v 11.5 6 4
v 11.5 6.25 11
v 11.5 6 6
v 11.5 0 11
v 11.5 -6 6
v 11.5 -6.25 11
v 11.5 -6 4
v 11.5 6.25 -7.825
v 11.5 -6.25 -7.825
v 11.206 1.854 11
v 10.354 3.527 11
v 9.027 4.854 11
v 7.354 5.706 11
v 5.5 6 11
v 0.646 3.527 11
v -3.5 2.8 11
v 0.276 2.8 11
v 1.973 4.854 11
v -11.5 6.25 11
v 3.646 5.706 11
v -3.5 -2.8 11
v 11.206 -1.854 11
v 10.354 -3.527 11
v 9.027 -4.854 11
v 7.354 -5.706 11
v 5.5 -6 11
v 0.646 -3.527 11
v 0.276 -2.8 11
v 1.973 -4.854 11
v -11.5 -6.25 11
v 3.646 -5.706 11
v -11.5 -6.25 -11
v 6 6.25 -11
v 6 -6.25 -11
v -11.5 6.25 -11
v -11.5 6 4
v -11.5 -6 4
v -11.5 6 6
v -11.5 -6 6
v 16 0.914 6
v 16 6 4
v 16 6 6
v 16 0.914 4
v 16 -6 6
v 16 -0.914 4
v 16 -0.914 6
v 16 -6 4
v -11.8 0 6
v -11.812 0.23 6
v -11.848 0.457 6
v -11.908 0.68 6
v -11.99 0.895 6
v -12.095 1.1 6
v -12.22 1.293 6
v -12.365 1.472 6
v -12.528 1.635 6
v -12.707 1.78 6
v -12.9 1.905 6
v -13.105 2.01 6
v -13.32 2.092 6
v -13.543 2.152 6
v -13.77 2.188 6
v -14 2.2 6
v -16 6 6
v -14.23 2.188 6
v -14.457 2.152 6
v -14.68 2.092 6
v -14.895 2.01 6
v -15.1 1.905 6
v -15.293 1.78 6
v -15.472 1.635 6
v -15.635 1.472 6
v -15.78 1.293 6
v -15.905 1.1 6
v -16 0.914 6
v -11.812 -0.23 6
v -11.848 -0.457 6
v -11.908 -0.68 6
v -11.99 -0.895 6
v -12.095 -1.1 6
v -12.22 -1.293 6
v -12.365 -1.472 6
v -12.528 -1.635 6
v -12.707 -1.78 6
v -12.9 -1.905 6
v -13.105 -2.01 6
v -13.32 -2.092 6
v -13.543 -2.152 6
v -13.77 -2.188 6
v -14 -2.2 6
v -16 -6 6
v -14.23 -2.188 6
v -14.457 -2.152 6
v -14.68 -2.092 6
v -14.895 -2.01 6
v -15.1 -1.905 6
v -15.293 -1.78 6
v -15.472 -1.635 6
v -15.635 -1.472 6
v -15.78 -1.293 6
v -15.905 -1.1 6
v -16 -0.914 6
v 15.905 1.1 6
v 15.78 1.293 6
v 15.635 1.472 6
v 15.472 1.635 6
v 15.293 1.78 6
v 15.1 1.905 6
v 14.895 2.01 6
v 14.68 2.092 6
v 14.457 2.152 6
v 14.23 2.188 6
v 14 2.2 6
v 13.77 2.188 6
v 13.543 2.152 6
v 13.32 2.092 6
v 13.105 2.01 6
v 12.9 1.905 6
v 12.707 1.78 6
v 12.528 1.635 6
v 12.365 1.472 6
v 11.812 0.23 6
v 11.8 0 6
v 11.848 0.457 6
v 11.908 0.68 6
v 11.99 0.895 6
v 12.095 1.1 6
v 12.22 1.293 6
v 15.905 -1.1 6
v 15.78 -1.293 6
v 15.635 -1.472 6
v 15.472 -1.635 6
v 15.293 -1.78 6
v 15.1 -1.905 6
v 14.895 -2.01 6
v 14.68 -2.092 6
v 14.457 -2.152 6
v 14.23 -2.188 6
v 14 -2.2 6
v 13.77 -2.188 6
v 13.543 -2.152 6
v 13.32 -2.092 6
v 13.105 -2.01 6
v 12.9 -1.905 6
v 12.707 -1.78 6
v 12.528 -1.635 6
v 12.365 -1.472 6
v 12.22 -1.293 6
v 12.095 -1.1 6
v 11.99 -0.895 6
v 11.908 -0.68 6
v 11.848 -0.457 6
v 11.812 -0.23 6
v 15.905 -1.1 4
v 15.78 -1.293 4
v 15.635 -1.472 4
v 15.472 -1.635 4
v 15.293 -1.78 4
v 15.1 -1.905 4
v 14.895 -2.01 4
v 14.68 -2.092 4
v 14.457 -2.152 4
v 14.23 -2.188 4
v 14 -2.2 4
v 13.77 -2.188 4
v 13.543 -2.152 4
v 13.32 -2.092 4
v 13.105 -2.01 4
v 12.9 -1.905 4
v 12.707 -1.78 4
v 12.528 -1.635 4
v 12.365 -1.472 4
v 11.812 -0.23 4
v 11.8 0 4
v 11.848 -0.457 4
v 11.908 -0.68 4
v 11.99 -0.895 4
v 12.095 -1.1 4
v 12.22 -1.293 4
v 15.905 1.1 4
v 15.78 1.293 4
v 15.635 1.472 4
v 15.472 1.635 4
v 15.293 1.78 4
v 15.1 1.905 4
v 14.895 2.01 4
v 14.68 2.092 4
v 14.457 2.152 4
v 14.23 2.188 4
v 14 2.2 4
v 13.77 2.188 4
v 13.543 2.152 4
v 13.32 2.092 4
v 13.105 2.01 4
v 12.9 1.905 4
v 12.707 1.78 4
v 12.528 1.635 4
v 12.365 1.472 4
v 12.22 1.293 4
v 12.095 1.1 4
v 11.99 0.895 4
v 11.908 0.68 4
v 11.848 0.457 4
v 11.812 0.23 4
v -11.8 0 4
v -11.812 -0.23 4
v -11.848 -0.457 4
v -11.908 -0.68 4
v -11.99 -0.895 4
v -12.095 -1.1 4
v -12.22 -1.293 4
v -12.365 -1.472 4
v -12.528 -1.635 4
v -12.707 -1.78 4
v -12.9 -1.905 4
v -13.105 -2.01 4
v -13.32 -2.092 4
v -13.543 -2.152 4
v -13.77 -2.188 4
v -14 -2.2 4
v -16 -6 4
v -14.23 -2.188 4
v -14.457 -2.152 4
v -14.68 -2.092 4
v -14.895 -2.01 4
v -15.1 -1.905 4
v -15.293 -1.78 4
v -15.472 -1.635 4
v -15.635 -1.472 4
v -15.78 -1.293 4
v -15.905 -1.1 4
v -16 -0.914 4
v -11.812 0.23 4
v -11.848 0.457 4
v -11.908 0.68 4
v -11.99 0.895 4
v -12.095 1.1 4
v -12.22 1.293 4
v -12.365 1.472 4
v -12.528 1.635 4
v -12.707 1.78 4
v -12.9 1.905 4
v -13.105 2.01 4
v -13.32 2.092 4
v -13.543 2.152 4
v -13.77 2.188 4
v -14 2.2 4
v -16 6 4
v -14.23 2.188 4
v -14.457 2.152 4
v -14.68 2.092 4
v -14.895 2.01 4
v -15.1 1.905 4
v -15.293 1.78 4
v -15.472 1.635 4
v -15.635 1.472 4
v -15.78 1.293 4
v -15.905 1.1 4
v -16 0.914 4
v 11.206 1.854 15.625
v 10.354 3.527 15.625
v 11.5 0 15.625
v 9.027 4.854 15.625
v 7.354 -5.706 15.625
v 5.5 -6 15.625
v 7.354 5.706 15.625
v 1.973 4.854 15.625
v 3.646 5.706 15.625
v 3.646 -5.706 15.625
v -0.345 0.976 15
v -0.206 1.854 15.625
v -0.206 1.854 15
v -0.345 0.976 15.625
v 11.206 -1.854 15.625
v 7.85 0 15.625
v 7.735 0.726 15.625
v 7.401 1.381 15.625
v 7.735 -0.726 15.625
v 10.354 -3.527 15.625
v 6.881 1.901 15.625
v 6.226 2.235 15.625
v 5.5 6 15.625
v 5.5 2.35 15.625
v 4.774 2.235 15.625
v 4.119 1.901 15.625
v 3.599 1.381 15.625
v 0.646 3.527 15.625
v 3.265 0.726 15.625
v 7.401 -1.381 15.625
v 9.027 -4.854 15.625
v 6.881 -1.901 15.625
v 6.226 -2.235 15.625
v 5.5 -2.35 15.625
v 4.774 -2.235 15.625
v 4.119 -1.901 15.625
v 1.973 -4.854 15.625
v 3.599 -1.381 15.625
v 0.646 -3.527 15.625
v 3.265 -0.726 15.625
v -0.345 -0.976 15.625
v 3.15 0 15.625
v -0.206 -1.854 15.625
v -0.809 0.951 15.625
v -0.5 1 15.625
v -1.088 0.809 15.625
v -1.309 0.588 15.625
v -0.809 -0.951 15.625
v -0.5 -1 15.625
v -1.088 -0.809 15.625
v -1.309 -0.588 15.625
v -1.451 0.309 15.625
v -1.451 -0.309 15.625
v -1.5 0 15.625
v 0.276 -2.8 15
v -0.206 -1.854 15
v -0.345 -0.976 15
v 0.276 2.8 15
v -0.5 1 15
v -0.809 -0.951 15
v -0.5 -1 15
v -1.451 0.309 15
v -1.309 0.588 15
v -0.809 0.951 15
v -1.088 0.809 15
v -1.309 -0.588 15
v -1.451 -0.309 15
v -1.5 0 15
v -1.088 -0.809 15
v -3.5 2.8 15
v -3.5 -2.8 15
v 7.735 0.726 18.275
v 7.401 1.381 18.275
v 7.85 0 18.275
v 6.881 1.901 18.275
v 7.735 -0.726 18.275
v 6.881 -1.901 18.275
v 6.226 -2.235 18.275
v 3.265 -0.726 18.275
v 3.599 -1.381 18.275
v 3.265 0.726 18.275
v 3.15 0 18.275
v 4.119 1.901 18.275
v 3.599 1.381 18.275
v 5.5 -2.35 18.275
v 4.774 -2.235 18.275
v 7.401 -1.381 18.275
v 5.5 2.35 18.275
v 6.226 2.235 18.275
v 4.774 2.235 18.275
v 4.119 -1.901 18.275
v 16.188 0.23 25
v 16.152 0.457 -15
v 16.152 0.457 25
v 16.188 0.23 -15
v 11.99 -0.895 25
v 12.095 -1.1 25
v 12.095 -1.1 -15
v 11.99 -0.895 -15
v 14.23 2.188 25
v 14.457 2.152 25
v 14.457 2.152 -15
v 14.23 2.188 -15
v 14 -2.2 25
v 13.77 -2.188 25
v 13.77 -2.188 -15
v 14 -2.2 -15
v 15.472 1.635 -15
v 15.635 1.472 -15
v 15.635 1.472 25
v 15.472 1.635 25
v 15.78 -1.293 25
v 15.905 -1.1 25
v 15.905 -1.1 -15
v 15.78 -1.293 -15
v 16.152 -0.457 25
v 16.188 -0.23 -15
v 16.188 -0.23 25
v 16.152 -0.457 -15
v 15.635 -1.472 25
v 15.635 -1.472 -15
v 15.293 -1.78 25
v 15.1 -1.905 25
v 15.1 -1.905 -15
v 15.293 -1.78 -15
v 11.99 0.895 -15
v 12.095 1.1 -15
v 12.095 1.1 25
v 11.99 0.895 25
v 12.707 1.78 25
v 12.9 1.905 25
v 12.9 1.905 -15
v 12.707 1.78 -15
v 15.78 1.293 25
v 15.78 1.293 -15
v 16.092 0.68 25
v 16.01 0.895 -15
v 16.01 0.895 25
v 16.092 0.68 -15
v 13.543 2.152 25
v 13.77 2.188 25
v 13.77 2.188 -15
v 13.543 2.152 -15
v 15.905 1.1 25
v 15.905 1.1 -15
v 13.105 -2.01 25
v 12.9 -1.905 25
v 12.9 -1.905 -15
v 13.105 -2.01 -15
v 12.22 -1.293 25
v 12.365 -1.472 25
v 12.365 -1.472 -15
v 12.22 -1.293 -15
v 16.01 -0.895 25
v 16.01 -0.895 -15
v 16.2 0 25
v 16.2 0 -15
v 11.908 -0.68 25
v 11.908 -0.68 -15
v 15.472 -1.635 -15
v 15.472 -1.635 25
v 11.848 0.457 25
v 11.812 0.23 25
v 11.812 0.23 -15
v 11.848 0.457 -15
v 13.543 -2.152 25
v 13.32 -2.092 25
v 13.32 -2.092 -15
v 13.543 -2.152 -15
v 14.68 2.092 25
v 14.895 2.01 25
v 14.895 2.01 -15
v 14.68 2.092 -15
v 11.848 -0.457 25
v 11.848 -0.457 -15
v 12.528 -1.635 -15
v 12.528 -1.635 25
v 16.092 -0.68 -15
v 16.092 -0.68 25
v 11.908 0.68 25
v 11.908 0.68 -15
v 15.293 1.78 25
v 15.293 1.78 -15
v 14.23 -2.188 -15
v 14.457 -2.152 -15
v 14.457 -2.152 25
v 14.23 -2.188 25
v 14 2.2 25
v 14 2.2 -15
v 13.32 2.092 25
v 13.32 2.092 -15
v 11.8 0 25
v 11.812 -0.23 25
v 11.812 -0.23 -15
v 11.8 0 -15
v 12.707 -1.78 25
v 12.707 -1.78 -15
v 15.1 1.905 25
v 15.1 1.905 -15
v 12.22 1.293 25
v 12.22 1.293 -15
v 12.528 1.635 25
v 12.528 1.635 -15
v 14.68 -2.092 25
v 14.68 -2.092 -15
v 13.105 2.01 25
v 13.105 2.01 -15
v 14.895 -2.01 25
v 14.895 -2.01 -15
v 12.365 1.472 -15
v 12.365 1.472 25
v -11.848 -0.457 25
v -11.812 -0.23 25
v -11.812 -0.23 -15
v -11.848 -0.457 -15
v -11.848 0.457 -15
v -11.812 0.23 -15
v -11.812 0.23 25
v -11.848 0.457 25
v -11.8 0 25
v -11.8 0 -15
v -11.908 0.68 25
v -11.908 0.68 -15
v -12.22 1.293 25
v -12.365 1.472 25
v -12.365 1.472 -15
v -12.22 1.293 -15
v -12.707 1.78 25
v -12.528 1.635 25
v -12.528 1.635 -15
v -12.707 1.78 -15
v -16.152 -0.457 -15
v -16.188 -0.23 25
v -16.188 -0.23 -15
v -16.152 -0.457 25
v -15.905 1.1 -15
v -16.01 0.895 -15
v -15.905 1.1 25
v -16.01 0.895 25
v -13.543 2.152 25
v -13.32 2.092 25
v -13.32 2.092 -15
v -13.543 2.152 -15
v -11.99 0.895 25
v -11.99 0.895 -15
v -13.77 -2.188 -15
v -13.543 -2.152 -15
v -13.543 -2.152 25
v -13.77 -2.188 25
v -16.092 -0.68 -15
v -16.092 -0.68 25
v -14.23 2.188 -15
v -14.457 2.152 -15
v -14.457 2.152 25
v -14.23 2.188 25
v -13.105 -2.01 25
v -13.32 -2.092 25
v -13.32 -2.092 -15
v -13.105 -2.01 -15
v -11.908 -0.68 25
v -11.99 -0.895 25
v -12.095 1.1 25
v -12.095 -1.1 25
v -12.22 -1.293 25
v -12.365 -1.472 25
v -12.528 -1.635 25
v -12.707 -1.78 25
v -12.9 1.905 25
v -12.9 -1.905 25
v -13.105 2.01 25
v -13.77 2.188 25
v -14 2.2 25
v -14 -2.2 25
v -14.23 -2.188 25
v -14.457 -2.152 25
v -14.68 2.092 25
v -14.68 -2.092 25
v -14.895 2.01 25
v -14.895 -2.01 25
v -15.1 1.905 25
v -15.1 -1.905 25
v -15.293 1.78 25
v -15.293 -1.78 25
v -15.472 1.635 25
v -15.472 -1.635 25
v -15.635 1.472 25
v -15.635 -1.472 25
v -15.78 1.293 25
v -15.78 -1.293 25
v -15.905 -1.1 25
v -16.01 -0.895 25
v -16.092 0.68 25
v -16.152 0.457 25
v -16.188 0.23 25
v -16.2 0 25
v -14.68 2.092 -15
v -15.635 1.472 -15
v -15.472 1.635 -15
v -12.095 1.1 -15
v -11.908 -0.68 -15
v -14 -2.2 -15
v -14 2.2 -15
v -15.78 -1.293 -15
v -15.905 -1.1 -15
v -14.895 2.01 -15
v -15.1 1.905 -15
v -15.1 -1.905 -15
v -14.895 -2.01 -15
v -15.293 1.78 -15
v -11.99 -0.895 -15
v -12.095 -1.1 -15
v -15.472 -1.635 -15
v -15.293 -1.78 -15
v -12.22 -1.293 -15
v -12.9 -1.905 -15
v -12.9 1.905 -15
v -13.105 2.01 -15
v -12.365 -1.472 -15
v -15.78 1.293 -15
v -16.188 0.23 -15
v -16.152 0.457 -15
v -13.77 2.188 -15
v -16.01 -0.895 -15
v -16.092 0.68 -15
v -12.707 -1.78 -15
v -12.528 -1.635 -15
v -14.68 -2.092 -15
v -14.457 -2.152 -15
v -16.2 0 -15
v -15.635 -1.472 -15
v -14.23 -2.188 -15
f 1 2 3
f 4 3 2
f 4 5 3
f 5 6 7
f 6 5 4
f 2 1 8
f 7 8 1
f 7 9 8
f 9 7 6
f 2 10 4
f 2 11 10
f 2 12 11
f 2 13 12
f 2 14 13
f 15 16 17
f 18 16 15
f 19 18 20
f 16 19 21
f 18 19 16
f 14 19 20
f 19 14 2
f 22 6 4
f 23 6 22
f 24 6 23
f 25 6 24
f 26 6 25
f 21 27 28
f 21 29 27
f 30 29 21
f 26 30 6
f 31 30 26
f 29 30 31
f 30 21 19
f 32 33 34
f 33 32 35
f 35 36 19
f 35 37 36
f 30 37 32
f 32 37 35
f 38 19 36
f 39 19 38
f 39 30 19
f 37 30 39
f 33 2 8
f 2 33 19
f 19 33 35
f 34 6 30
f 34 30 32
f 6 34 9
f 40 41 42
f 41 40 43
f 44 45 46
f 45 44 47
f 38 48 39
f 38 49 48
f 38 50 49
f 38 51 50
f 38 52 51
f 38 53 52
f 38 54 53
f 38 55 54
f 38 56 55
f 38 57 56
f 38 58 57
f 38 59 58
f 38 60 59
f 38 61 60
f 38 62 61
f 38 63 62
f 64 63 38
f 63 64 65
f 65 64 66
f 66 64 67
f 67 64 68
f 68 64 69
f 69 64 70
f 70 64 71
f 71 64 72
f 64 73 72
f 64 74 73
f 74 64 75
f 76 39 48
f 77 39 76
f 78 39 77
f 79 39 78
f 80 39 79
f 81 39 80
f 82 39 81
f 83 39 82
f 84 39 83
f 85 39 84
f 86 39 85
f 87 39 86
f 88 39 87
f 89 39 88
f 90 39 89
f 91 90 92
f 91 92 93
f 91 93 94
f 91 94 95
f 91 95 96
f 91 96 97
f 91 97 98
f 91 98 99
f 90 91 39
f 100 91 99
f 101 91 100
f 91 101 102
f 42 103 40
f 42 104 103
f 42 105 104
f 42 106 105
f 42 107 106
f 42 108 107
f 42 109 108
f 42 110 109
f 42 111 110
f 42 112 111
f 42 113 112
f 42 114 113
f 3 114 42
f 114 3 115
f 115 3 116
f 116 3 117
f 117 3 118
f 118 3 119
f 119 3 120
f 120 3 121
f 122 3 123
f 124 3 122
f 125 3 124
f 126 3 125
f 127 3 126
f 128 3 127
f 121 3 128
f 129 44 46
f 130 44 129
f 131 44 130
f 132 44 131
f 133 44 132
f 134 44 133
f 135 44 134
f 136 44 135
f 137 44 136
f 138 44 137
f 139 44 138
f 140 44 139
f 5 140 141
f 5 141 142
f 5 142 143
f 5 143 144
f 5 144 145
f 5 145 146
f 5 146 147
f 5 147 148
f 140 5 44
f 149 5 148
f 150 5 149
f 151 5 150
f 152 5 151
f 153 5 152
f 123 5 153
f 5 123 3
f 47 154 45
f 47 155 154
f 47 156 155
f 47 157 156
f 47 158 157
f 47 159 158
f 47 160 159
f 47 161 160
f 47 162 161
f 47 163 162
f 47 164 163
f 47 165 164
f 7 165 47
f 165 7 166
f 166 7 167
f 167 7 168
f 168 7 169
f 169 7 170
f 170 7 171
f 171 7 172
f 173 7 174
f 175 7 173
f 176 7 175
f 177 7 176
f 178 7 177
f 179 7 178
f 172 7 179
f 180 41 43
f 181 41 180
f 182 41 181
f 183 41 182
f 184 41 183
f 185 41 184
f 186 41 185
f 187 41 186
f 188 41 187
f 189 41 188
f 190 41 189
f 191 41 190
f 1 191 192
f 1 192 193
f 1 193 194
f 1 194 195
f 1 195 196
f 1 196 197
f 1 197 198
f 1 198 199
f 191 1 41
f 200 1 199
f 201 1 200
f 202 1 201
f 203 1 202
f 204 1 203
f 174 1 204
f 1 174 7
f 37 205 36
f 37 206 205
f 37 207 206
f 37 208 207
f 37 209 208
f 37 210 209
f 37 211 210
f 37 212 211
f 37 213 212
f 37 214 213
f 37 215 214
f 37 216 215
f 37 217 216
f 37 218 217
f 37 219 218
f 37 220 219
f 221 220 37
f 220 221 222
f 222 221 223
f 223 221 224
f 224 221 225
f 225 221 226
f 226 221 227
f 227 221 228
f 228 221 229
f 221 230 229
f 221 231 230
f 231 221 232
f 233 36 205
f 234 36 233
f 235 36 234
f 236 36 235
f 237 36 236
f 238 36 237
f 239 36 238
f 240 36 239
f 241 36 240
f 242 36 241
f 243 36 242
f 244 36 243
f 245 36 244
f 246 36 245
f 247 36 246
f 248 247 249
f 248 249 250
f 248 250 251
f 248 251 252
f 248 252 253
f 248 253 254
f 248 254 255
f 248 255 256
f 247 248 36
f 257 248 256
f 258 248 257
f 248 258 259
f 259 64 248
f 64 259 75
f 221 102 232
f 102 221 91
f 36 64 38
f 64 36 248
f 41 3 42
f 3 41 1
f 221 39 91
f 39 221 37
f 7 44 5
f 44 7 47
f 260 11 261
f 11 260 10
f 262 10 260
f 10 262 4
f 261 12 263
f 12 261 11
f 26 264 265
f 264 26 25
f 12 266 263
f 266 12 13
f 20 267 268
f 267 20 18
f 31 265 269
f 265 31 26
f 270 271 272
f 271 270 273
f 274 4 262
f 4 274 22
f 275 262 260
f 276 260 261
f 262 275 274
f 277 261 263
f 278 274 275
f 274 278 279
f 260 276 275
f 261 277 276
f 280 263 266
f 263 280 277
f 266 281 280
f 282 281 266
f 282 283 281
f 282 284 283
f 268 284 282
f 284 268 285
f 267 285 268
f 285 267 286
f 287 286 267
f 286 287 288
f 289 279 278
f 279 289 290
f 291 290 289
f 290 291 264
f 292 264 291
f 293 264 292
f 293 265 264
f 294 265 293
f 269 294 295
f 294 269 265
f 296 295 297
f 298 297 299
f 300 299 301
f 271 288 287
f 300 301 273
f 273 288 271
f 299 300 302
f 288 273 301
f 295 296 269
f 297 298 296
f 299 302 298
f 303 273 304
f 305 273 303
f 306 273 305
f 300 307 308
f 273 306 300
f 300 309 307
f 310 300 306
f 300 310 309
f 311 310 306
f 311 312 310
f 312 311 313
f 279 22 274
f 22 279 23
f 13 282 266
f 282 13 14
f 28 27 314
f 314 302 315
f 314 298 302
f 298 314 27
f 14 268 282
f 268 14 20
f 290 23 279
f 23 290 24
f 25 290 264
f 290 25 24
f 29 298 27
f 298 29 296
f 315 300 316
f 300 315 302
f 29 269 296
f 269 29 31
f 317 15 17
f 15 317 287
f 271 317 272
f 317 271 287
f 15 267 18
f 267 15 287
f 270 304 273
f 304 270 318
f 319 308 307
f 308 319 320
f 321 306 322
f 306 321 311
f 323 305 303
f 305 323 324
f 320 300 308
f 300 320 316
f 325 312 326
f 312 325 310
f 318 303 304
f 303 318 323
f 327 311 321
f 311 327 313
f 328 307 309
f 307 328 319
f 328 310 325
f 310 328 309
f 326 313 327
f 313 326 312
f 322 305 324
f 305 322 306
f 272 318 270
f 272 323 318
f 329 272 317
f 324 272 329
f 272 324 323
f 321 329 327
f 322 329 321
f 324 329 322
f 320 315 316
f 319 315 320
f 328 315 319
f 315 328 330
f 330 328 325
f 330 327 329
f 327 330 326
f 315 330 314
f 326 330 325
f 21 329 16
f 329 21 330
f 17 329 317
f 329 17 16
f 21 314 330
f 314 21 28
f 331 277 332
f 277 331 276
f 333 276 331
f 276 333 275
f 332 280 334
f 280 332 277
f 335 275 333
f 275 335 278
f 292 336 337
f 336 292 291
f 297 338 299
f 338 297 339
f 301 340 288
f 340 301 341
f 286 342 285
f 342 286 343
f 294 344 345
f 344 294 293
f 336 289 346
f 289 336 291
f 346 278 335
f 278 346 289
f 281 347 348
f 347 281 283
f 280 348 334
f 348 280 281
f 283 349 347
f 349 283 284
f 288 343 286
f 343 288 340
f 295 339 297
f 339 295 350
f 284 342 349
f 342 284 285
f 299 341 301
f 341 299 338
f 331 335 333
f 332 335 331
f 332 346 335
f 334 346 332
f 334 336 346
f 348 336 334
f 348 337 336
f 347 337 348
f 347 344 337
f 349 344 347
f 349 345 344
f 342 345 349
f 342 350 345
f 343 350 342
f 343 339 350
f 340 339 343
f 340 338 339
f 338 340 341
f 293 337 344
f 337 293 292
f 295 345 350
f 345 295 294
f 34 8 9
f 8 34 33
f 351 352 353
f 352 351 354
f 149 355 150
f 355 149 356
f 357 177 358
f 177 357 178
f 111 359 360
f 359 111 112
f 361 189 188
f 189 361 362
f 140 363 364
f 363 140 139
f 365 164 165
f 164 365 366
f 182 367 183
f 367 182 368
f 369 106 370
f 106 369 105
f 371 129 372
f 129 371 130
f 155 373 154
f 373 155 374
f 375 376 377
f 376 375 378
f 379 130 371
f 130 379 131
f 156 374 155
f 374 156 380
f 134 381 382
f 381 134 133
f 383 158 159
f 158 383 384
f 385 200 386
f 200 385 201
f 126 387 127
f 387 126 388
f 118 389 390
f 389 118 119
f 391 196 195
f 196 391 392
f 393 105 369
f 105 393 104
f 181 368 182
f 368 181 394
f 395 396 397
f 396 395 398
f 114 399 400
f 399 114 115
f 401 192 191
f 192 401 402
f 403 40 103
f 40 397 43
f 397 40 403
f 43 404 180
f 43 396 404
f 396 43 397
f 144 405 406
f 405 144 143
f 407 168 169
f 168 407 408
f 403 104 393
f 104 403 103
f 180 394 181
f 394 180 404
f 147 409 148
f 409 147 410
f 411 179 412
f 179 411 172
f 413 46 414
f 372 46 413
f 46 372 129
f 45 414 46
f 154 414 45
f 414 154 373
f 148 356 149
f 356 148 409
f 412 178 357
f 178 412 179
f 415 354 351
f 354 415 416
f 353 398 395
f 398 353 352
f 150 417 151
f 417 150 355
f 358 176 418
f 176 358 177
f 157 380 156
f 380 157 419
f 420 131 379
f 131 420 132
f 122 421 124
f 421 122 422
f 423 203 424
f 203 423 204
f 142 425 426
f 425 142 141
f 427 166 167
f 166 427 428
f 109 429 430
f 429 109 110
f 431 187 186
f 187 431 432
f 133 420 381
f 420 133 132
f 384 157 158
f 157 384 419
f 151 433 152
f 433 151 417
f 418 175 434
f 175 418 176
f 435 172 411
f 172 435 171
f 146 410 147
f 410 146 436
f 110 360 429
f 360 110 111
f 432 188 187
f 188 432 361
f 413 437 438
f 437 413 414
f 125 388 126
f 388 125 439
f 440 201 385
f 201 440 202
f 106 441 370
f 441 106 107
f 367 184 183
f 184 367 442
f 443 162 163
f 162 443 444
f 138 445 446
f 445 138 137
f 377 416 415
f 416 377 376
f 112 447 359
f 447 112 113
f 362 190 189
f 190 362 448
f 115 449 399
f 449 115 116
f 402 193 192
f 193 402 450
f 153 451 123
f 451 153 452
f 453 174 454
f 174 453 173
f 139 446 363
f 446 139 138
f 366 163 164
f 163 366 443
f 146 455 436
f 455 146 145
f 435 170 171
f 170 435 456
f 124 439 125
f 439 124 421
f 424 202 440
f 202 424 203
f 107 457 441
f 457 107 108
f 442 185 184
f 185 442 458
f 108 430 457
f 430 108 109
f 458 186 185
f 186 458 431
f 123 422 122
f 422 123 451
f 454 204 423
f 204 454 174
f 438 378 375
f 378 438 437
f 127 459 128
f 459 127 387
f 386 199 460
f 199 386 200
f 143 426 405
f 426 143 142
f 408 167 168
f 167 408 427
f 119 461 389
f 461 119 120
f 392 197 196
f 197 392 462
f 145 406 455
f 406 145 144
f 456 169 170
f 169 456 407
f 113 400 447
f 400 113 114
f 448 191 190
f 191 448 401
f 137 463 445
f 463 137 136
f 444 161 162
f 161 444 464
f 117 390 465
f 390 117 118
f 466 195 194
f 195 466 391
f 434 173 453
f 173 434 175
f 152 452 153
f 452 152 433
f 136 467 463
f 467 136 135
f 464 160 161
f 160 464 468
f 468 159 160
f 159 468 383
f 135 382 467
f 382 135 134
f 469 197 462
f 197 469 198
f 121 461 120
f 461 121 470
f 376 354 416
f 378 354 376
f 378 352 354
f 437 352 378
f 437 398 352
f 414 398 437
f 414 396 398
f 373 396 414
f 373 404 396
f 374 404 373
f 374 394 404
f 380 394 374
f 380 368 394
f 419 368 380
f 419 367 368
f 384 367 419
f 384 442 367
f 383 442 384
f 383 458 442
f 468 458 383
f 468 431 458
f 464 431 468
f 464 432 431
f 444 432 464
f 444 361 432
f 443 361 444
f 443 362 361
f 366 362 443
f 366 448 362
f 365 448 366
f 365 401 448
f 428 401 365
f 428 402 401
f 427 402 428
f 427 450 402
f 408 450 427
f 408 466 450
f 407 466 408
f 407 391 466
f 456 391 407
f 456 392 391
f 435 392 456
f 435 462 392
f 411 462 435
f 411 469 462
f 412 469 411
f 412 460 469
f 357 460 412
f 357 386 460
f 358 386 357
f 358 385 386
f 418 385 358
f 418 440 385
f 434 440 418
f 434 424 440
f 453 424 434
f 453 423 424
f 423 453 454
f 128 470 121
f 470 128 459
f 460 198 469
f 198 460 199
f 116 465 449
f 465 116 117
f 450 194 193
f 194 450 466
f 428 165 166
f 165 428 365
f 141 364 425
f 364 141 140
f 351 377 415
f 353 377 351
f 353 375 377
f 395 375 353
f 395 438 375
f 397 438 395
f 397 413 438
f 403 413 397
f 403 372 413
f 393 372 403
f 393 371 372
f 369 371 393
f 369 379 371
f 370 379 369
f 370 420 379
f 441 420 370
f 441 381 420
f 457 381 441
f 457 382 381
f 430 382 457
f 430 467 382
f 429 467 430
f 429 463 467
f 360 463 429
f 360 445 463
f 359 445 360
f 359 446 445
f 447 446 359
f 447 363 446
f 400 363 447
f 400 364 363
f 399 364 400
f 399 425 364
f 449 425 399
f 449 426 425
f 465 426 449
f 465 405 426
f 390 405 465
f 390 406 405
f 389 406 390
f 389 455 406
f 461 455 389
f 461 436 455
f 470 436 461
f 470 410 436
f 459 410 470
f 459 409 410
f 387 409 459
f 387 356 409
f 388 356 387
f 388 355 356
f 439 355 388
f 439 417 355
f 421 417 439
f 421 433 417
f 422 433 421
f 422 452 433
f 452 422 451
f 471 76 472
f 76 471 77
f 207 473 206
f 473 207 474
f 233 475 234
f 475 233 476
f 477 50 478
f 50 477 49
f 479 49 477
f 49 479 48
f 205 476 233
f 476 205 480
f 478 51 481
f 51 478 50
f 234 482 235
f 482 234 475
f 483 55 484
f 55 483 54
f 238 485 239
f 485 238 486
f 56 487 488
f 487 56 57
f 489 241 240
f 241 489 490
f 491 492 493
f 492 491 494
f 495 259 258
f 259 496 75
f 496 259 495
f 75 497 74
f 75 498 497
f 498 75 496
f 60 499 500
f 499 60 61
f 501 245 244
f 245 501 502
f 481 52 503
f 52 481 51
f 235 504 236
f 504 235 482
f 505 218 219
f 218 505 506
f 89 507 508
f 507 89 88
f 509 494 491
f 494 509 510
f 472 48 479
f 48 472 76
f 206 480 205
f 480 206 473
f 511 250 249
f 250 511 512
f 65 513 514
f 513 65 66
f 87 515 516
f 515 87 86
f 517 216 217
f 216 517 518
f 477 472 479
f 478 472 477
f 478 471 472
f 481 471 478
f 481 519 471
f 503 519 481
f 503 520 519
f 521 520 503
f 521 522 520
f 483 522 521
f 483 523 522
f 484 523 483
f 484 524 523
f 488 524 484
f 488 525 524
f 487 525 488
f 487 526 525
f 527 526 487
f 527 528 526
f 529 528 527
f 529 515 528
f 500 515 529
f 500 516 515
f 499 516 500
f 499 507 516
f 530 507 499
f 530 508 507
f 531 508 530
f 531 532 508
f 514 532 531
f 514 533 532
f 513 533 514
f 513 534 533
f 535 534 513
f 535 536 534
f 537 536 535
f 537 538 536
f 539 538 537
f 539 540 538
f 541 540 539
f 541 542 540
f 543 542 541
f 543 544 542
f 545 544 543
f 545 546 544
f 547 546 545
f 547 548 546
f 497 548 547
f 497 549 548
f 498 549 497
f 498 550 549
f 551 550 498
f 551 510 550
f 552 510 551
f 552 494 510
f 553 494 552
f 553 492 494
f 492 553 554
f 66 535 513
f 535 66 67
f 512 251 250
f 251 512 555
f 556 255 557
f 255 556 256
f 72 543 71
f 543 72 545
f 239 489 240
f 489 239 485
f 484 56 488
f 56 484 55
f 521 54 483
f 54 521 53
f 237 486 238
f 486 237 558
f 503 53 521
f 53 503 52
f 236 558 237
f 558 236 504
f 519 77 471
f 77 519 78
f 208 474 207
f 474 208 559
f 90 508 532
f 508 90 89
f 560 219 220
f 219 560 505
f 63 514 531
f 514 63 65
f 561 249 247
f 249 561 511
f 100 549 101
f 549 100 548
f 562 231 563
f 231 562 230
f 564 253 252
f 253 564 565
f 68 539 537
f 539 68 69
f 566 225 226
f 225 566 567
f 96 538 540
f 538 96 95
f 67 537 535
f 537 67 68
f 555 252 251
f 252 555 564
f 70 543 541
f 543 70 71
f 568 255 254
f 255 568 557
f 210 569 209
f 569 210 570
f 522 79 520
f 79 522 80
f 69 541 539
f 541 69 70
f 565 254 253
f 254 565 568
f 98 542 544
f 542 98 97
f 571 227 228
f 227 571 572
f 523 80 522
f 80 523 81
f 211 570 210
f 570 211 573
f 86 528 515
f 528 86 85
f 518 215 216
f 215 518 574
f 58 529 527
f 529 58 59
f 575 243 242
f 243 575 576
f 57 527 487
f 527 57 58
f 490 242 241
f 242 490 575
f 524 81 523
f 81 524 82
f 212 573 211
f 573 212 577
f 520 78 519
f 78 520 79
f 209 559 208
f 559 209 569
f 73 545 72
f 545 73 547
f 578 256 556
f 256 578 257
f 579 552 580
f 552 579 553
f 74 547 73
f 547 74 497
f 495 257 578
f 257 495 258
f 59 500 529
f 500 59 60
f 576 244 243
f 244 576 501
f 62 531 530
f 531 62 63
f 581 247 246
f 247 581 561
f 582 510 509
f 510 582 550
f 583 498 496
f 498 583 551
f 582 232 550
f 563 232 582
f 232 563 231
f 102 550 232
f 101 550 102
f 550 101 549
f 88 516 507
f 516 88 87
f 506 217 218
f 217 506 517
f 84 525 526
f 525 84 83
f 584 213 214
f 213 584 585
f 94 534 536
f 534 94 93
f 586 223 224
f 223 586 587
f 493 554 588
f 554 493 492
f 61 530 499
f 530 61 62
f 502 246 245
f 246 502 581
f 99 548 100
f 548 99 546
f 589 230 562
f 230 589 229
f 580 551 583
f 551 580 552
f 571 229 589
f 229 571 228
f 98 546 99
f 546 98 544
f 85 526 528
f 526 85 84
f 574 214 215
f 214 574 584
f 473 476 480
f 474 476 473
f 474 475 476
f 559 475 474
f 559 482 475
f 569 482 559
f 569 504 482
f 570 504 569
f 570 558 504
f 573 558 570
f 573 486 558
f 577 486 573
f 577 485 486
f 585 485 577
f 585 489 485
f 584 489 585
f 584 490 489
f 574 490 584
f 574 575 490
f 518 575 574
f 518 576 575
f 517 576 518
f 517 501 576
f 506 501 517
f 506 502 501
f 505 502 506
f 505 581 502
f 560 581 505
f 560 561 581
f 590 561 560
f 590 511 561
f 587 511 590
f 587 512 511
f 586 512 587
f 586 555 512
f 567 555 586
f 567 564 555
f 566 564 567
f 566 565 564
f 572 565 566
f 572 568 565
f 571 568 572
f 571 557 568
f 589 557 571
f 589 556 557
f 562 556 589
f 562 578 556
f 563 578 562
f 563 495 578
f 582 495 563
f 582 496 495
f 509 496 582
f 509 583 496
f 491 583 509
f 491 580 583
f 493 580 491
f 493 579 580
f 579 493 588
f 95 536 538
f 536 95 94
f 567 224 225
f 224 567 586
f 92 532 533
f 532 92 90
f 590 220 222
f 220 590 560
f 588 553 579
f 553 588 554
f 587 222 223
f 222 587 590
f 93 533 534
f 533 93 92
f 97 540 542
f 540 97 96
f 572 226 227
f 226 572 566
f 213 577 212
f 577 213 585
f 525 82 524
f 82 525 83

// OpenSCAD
$fn=60;
sg90_motor();

module sg90_motor(){
	difference(){			
		union(){
			color("green") cube([23,12.5,22], center=true);
			color("blue") translate([0,0,5]) cube([32,12,2], center=true);
			color("blue") translate([5.5,0,2.75]) cylinder(r=6, h=25.75, $fn=20, center=true);
			color("blue") translate([-.5,0,2.75]) cylinder(r=1, h=25.75, $fn=20, center=true);
			color("blue") translate([-1,0,2.75]) cube([5,5.6,24.5], center=true);		
			color("white") translate([5.5,0,3.65]) cylinder(r=2.35, h=29.25, $fn=20, center=true);				
		} // of union()
		translate([10,0,-11]) rotate([0,-30,0]) cube([8,13,4], center=true);
		for ( hole = [14,-14] ){
			translate([hole,0,5]) cylinder(r=2.2, h=4, $fn=20, center=true);
		}	// of for loop
	} // of difference()
    translate([14,0,5])  cylinder(r=2.2,h=40, center=true);
    translate([-14,0,5]) cylinder(r=2.2,h=40, center=true);
} // of module()
